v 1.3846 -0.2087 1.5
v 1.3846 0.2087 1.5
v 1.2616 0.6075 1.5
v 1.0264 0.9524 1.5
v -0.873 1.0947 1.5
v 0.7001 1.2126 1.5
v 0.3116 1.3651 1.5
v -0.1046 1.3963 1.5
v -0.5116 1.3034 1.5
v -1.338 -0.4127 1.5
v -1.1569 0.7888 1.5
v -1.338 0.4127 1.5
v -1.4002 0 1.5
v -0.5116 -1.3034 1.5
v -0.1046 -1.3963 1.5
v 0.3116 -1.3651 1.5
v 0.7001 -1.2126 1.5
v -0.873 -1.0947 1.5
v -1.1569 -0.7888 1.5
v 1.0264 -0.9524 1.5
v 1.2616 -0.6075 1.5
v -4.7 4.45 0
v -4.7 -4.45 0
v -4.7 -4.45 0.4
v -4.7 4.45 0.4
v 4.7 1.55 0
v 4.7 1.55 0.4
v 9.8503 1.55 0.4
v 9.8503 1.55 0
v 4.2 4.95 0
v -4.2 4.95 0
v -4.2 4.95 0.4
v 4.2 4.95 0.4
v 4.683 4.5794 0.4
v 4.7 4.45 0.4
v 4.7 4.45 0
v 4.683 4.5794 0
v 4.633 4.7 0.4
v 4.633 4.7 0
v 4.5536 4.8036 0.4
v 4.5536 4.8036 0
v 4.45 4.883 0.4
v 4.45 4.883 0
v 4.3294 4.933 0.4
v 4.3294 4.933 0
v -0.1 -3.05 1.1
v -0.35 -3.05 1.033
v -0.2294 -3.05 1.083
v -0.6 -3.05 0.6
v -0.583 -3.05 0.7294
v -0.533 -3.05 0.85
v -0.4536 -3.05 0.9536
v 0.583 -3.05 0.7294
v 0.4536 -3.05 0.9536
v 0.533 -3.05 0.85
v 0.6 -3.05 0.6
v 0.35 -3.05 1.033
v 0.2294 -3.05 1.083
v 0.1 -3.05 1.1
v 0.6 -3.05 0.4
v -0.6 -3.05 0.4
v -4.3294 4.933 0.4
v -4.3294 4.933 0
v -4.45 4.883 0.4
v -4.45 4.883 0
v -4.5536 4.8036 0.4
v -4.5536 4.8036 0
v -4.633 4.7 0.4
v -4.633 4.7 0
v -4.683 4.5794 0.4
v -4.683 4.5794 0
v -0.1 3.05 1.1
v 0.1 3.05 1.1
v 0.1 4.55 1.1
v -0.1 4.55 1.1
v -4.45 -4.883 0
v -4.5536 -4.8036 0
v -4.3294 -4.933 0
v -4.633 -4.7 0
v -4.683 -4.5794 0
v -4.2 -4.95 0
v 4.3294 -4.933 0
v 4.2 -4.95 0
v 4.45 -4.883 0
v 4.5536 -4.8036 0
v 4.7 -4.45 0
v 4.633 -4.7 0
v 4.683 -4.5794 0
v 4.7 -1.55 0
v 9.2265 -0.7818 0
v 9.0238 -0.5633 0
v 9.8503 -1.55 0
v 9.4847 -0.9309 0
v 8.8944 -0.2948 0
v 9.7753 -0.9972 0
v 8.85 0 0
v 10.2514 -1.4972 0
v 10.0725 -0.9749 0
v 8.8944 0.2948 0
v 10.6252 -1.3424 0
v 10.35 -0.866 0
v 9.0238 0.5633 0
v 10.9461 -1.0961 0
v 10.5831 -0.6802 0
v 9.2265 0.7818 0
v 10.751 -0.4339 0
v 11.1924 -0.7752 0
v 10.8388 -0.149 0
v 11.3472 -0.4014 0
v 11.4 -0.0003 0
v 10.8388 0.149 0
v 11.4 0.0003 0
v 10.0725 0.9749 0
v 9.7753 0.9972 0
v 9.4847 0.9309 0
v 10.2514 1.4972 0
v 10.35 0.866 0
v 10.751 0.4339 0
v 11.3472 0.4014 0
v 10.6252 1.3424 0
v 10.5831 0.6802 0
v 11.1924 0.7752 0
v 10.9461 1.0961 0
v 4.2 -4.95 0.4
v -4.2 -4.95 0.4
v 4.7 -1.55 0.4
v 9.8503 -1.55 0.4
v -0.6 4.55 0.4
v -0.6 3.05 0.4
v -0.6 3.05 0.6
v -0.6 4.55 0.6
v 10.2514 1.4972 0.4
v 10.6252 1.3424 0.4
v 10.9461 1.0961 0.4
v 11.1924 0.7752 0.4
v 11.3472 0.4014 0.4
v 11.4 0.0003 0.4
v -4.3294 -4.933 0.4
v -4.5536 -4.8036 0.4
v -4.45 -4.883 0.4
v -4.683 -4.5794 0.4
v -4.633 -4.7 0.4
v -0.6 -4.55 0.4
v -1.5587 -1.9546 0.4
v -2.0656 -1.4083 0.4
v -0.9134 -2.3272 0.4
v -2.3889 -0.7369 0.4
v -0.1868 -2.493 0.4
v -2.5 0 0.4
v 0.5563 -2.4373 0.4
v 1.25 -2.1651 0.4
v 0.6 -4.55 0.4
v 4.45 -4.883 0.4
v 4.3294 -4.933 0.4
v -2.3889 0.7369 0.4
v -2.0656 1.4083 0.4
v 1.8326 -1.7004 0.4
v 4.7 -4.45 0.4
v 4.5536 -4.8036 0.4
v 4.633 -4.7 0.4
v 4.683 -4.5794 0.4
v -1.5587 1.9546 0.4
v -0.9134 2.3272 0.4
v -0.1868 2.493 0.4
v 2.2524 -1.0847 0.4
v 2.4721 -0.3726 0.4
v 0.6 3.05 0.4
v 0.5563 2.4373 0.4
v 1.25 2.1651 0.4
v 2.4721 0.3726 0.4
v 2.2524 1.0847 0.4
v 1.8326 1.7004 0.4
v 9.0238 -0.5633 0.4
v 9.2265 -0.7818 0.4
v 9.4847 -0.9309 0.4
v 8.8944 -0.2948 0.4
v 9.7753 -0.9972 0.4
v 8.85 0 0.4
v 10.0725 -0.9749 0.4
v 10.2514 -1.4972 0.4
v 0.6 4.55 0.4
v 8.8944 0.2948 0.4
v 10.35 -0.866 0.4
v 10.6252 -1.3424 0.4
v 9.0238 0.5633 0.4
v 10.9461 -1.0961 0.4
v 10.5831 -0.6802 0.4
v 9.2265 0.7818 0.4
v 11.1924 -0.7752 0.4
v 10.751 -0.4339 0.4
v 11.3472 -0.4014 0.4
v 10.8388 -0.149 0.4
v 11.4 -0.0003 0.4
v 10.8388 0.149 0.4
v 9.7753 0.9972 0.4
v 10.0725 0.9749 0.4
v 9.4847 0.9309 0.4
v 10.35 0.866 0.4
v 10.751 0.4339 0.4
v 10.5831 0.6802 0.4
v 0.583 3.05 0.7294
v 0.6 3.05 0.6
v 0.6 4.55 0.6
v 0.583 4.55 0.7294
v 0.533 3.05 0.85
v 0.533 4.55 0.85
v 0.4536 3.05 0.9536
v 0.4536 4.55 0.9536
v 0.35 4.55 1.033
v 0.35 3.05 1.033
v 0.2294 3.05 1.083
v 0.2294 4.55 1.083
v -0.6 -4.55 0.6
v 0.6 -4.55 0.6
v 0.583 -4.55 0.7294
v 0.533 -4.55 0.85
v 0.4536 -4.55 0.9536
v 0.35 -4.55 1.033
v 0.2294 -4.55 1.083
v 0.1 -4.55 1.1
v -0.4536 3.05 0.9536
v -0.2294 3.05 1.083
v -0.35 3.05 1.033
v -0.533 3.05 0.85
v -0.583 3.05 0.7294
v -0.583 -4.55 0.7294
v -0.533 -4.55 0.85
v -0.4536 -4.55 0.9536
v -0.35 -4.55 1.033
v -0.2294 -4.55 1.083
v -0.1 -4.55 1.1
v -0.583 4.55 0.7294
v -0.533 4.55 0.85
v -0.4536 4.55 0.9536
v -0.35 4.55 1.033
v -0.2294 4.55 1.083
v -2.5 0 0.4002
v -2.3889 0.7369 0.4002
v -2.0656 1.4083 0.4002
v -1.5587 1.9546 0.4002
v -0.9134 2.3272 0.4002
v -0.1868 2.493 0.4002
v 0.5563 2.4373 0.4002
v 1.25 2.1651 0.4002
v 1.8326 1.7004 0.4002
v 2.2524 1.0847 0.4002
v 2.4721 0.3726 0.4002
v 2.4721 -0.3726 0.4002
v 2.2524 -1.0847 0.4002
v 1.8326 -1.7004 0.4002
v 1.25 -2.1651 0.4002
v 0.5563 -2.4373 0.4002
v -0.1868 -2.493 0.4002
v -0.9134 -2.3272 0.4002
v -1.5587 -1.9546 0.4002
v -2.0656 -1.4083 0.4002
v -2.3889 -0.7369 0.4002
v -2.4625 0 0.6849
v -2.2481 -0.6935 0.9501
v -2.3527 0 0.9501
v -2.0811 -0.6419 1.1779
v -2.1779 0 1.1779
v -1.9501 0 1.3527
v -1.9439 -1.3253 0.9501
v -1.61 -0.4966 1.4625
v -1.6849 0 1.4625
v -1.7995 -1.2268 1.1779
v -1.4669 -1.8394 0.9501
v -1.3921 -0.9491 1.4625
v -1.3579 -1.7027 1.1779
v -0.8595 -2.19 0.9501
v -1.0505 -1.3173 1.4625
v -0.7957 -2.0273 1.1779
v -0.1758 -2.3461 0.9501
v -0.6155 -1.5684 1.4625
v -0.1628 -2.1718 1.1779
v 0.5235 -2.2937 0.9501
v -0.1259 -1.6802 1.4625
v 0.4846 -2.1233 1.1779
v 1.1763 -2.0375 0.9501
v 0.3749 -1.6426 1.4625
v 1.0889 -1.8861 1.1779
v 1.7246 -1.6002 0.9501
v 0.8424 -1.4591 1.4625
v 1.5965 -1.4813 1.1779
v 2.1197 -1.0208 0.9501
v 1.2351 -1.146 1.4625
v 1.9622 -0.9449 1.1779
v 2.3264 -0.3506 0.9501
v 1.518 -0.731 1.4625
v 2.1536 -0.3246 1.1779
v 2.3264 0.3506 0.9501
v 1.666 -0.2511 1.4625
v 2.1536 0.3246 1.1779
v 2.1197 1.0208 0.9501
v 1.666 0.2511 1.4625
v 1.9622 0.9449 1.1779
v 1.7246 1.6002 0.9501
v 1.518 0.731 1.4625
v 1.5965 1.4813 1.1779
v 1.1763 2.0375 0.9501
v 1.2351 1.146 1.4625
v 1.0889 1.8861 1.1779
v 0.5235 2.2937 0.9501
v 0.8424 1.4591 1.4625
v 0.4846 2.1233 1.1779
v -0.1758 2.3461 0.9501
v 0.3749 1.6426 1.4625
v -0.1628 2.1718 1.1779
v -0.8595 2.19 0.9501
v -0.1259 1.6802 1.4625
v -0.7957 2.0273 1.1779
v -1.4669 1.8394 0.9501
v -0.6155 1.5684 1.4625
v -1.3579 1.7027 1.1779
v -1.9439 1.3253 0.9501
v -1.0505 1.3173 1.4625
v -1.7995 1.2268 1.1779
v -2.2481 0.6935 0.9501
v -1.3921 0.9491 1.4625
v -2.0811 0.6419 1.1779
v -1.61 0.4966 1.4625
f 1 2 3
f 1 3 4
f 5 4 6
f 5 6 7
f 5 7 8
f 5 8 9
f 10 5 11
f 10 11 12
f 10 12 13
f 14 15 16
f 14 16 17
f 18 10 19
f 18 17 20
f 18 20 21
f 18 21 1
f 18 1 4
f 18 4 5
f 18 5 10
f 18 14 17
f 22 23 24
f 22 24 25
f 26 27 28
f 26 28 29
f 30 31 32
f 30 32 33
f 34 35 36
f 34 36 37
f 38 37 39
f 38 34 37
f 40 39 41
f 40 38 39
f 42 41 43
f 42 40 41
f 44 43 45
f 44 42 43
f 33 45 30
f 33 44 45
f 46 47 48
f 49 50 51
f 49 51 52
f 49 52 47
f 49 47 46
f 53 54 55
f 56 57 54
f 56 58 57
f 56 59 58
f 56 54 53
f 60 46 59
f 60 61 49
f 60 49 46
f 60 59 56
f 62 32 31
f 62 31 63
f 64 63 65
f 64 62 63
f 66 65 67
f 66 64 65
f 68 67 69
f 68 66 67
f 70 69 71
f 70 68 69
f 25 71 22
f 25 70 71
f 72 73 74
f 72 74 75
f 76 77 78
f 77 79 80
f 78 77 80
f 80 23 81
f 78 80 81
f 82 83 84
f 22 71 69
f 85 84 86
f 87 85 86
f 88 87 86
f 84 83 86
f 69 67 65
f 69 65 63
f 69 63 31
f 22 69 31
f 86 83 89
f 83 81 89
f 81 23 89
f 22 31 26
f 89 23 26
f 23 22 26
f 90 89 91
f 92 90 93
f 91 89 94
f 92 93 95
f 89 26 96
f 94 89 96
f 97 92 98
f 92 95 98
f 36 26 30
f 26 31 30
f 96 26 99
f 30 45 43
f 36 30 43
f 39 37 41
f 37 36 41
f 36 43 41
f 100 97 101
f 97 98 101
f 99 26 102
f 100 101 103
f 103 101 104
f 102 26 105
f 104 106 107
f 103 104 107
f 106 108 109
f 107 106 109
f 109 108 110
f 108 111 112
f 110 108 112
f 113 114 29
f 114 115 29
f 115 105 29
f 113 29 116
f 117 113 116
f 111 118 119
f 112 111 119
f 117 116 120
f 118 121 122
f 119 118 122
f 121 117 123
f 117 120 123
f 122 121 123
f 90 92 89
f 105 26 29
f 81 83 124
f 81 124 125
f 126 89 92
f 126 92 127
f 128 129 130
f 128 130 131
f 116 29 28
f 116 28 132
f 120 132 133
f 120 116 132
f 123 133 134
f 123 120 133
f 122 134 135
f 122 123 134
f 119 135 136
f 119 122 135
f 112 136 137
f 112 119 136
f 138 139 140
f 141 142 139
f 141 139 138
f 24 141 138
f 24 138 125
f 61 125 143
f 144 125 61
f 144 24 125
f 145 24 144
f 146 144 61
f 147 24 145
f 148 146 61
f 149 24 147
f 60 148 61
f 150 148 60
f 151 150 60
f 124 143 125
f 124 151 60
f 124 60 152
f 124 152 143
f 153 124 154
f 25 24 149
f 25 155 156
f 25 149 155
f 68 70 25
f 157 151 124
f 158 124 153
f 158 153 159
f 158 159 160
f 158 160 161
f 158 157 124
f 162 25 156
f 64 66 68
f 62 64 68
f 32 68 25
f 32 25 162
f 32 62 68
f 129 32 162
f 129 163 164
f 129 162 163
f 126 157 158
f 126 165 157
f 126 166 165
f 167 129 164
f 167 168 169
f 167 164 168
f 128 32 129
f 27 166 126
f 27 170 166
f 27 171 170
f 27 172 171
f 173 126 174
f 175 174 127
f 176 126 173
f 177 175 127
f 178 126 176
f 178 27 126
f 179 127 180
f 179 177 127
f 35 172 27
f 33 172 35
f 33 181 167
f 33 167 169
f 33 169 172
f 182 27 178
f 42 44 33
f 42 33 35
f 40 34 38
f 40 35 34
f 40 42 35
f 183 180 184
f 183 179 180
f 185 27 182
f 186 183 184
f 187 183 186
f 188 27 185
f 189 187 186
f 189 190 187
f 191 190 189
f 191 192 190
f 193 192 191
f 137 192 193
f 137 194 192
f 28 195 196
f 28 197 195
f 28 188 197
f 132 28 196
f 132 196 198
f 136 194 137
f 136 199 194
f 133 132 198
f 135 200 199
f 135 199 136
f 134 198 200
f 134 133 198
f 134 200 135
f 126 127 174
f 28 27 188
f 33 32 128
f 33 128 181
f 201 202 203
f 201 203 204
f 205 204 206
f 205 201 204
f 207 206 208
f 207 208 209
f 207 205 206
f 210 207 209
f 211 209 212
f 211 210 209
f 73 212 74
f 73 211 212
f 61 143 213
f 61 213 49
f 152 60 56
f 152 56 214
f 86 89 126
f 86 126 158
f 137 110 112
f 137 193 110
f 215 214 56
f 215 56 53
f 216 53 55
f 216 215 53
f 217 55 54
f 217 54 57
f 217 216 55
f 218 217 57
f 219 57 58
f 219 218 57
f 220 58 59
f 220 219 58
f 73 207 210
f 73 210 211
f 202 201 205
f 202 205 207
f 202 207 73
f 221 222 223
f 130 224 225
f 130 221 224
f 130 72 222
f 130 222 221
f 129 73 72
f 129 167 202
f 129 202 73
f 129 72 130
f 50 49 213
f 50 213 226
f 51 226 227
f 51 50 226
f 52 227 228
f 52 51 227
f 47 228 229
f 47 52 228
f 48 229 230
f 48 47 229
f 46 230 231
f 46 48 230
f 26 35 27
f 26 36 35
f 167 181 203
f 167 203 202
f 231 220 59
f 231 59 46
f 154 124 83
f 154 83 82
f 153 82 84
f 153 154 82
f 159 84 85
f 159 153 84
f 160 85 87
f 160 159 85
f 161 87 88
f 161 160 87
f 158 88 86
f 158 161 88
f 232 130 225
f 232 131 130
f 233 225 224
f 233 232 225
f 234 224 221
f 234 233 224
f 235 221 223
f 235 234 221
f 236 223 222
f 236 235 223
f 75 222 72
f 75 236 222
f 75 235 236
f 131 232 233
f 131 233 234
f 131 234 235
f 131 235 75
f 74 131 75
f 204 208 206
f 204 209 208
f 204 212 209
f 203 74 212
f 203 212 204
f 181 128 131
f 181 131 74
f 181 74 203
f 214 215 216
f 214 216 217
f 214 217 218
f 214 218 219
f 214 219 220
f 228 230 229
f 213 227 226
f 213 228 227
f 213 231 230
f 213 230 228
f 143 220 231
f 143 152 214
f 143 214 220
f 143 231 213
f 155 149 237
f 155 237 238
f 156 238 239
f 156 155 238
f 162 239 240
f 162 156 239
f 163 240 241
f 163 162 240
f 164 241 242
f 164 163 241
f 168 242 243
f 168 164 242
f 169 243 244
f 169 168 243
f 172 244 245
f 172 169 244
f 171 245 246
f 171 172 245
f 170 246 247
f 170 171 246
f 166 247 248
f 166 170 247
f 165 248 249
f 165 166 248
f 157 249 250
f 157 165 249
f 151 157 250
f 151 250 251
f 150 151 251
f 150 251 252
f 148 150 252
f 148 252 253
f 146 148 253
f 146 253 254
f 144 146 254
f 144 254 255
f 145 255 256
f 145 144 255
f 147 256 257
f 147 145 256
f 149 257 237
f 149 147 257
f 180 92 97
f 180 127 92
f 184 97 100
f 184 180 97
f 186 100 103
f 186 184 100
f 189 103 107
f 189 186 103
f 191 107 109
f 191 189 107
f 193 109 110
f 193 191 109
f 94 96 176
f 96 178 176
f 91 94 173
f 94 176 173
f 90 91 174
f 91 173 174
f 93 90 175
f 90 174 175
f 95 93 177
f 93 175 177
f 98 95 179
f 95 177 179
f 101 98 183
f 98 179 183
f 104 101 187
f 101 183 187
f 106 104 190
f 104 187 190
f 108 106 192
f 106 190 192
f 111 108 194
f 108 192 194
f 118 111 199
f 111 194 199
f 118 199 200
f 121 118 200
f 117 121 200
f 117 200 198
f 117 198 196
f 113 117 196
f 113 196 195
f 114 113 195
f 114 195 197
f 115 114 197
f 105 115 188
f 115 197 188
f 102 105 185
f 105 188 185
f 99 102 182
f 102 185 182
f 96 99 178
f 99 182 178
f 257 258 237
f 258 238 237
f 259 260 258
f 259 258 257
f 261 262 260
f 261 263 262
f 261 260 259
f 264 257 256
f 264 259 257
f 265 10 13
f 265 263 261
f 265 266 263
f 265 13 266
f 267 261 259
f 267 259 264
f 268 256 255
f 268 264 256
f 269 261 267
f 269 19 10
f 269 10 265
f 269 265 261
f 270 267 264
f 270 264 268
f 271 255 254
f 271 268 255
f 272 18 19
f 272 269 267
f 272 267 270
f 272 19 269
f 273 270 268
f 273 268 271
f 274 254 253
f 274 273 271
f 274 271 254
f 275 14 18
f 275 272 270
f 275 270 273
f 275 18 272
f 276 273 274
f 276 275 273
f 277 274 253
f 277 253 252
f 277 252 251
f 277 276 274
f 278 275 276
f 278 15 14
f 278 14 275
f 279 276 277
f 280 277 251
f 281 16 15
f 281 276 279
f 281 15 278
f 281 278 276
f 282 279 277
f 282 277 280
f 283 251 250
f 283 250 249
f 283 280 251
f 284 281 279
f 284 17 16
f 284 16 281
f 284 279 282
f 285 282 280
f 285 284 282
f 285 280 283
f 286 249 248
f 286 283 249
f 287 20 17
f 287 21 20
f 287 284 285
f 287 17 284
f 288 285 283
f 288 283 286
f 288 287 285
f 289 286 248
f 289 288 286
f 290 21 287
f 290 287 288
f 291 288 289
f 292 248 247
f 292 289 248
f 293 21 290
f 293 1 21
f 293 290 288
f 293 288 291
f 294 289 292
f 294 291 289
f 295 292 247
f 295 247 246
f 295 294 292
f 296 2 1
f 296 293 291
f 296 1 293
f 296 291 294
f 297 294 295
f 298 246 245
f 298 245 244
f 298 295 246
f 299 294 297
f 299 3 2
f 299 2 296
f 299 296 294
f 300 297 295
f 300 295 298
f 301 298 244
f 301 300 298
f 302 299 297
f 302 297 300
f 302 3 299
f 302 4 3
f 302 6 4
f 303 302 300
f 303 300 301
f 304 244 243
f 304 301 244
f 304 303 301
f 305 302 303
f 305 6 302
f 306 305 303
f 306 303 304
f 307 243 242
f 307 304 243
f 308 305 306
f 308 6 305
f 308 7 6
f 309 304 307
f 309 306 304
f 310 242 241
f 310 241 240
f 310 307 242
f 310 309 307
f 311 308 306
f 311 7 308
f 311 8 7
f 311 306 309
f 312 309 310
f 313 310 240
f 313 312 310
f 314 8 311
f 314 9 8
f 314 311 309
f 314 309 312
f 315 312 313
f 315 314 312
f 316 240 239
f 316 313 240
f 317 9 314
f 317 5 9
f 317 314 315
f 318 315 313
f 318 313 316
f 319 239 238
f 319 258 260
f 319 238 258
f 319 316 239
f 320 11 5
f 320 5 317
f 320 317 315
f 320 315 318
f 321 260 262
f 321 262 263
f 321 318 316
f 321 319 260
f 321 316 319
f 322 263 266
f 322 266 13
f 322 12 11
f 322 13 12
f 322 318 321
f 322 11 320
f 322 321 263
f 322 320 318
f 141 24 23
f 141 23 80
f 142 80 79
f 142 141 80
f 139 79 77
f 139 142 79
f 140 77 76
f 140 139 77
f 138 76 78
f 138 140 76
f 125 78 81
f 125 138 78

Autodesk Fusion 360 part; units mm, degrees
sketch "Base" plane through (0, 0, 0) normal (0, 0, 1) x (1, 0, 0) in component "Connector (AAA-Positive)"
  line L0 (4.7, -4.95) -> (-4.7, -4.95)
  line L1 (-4.7, -4.95) -> (-4.7, 4.95)
  line L2 (-4.7, 4.95) -> (4.7, 4.95)
  line L3 (4.7, 4.95) -> (4.7, -4.95)
  line L4 (4.7, -4.95) -> (-4.7, 4.95) construction
  line L5 (-4.7, -4.95) -> (4.7, 4.95) construction
  dimension "d1" = 9.4
  dimension "d2" = 9.9
extrude "Extrude1" add sketch "Base" along normal blind 0.4 in component "Connector (AAA-Positive)"
fillet "Fillet1" radius 0.5 4 edges at (4.7, -4.95, 0.2) (4.7, 4.95, 0.2) (-4.7, 4.95, 0.2) (-4.7, -4.95, 0.2) in component "Connector (AAA-Positive)"
sketch "Connector" plane through (4.7, 0, 0) normal (1, 0, 0) x (0, 1, 0) in component "Connector (AAA-Positive)"
  line L0 (4.45, 0) -> (4.45, 0.4)
  line L1 (4.45, 0.4) -> (-4.45, 0.4)
  line L2 (-4.45, 0.4) -> (-4.45, 0)
  line L3 (-4.45, 0) -> (4.45, 0)
  line L4 (-4.45, 0.2) -> (4.45, 0.2) construction
  line L5 (1.55, 0) -> (-1.55, 0)
  line L6 (-1.55, 0) -> (-1.55, 0.4)
  line L7 (-1.55, 0.4) -> (1.55, 0.4)
  line L8 (1.55, 0.4) -> (1.55, 0)
  line L9 (1.55, 0) -> (-1.55, 0.4) construction
  line L10 (-1.55, 0) -> (1.55, 0.4) construction
  point P0 (0, 0.2)
  dimension "d6" = 3.1
extrude "Extrude2" add sketch "Connector" along normal blind 6.7 contours L1 L3 L5 L6 L7 L8 in component "Connector (AAA-Positive)"
fillet "Fillet2" radius 1.55 2 edges at (11.4, -1.55, 0.2) (11.4, 1.55, 0.2) in component "Connector (AAA-Positive)"
sketch "Taps" plane through (0, 0, 0.4) normal (0, 0, 1) x (-1, 0, 0) in component "Connector (AAA-Positive)"
  arc A0 (-9.85, 1.55) -> (-9.85, -1.55) centre (-9.85, 0) ccw
  line L0 (-9.85, -1.55) -> (-4.7, -1.55)
  line L1 (-4.7, -1.55) -> (-4.7, -4.45)
  arc A1 (-4.7, -4.45) -> (-4.2, -4.95) centre (-4.2, -4.45) ccw
  line L2 (-4.2, -4.95) -> (4.2, -4.95)
  arc A2 (4.2, -4.95) -> (4.7, -4.45) centre (4.2, -4.45) ccw
  line L3 (4.7, -4.45) -> (4.7, 4.45)
  arc A3 (4.7, 4.45) -> (4.2, 4.95) centre (4.2, 4.45) ccw
  line L4 (4.2, 4.95) -> (-4.2, 4.95)
  arc A4 (-4.2, 4.95) -> (-4.7, 4.45) centre (-4.2, 4.45) ccw
  line L5 (-4.7, 4.45) -> (-4.7, 1.55)
  line L6 (-4.7, 1.55) -> (-9.85, 1.55)
  line L7 (4.7, 0) -> (-11.4, 0) construction
  line L8 (-9.85, -1.55) -> (-9.85, 1.55) construction
  circle A5 centre (-9.85, 0) radius 1
  line L9 (0, -4.95) -> (0, 4.95) construction
  circle A6 centre (0, 0) radius 2.5
  line L10 (-0.6, -3.05) -> (0.6, -3.05)
  line L11 (0.6, -3.05) -> (0.6, -4.55)
  line L12 (0.6, -4.55) -> (-0.6, -4.55)
  line L13 (-0.6, -4.55) -> (-0.6, -3.05)
  line L14 (-0.6, -3.05) -> (0.6, -4.55) construction
  line L15 (0.6, -3.05) -> (-0.6, -4.55) construction
  line L16 (-0.6, 4.55) -> (0.6, 4.55)
  line L17 (0.6, 4.55) -> (0.6, 3.05)
  line L18 (0.6, 3.05) -> (-0.6, 3.05)
  line L19 (-0.6, 3.05) -> (-0.6, 4.55)
  line L20 (-0.6, 4.55) -> (0.6, 3.05) construction
  line L21 (0.6, 4.55) -> (-0.6, 3.05) construction
  point P0 (0, -3.8)
  point P1 (0, 3.8)
  dimension "d10" = 1.55
  dimension "d11" = 2
  dimension "d12" = 5
  dimension "d13" = 1.2
  dimension "d14" = 1.5
  dimension "d15" = 0.4
  dimension "d16" = 1.2
  dimension "d17" = 1.5
  dimension "d18" = 0.4
extrude "Extrude3" cut sketch "Taps" against normal up to surface (0.4 mm away) contours A5 in component "Connector (AAA-Positive)"
extrude "Extrude4" add sketch "Taps" along normal blind 0.7 contours L10 L11 L12 L13 | L16 L17 L18 L19 in component "Connector (AAA-Positive)"
fillet "Fillet3" radius 0.5 4 edges at (0.6, 3.8, 1.1) (0.6, -3.8, 1.1) (-0.6, -3.8, 1.1) (-0.6, 3.8, 1.1) in component "Connector (AAA-Positive)"
extrude "Extrude5" add sketch "Taps" along normal blind 1.1 contours A6 in component "Connector (AAA-Positive)"
fillet "Fillet4" radius 1.1 1 edges at (2.3308, 0.904, 1.5) in component "Connector (AAA-Positive)"
component "Connector (AAA-Positive)" placed x (1, 0, 0) y (0, 1, 0) z (0, 0, 1) at (0, 0, 0)
